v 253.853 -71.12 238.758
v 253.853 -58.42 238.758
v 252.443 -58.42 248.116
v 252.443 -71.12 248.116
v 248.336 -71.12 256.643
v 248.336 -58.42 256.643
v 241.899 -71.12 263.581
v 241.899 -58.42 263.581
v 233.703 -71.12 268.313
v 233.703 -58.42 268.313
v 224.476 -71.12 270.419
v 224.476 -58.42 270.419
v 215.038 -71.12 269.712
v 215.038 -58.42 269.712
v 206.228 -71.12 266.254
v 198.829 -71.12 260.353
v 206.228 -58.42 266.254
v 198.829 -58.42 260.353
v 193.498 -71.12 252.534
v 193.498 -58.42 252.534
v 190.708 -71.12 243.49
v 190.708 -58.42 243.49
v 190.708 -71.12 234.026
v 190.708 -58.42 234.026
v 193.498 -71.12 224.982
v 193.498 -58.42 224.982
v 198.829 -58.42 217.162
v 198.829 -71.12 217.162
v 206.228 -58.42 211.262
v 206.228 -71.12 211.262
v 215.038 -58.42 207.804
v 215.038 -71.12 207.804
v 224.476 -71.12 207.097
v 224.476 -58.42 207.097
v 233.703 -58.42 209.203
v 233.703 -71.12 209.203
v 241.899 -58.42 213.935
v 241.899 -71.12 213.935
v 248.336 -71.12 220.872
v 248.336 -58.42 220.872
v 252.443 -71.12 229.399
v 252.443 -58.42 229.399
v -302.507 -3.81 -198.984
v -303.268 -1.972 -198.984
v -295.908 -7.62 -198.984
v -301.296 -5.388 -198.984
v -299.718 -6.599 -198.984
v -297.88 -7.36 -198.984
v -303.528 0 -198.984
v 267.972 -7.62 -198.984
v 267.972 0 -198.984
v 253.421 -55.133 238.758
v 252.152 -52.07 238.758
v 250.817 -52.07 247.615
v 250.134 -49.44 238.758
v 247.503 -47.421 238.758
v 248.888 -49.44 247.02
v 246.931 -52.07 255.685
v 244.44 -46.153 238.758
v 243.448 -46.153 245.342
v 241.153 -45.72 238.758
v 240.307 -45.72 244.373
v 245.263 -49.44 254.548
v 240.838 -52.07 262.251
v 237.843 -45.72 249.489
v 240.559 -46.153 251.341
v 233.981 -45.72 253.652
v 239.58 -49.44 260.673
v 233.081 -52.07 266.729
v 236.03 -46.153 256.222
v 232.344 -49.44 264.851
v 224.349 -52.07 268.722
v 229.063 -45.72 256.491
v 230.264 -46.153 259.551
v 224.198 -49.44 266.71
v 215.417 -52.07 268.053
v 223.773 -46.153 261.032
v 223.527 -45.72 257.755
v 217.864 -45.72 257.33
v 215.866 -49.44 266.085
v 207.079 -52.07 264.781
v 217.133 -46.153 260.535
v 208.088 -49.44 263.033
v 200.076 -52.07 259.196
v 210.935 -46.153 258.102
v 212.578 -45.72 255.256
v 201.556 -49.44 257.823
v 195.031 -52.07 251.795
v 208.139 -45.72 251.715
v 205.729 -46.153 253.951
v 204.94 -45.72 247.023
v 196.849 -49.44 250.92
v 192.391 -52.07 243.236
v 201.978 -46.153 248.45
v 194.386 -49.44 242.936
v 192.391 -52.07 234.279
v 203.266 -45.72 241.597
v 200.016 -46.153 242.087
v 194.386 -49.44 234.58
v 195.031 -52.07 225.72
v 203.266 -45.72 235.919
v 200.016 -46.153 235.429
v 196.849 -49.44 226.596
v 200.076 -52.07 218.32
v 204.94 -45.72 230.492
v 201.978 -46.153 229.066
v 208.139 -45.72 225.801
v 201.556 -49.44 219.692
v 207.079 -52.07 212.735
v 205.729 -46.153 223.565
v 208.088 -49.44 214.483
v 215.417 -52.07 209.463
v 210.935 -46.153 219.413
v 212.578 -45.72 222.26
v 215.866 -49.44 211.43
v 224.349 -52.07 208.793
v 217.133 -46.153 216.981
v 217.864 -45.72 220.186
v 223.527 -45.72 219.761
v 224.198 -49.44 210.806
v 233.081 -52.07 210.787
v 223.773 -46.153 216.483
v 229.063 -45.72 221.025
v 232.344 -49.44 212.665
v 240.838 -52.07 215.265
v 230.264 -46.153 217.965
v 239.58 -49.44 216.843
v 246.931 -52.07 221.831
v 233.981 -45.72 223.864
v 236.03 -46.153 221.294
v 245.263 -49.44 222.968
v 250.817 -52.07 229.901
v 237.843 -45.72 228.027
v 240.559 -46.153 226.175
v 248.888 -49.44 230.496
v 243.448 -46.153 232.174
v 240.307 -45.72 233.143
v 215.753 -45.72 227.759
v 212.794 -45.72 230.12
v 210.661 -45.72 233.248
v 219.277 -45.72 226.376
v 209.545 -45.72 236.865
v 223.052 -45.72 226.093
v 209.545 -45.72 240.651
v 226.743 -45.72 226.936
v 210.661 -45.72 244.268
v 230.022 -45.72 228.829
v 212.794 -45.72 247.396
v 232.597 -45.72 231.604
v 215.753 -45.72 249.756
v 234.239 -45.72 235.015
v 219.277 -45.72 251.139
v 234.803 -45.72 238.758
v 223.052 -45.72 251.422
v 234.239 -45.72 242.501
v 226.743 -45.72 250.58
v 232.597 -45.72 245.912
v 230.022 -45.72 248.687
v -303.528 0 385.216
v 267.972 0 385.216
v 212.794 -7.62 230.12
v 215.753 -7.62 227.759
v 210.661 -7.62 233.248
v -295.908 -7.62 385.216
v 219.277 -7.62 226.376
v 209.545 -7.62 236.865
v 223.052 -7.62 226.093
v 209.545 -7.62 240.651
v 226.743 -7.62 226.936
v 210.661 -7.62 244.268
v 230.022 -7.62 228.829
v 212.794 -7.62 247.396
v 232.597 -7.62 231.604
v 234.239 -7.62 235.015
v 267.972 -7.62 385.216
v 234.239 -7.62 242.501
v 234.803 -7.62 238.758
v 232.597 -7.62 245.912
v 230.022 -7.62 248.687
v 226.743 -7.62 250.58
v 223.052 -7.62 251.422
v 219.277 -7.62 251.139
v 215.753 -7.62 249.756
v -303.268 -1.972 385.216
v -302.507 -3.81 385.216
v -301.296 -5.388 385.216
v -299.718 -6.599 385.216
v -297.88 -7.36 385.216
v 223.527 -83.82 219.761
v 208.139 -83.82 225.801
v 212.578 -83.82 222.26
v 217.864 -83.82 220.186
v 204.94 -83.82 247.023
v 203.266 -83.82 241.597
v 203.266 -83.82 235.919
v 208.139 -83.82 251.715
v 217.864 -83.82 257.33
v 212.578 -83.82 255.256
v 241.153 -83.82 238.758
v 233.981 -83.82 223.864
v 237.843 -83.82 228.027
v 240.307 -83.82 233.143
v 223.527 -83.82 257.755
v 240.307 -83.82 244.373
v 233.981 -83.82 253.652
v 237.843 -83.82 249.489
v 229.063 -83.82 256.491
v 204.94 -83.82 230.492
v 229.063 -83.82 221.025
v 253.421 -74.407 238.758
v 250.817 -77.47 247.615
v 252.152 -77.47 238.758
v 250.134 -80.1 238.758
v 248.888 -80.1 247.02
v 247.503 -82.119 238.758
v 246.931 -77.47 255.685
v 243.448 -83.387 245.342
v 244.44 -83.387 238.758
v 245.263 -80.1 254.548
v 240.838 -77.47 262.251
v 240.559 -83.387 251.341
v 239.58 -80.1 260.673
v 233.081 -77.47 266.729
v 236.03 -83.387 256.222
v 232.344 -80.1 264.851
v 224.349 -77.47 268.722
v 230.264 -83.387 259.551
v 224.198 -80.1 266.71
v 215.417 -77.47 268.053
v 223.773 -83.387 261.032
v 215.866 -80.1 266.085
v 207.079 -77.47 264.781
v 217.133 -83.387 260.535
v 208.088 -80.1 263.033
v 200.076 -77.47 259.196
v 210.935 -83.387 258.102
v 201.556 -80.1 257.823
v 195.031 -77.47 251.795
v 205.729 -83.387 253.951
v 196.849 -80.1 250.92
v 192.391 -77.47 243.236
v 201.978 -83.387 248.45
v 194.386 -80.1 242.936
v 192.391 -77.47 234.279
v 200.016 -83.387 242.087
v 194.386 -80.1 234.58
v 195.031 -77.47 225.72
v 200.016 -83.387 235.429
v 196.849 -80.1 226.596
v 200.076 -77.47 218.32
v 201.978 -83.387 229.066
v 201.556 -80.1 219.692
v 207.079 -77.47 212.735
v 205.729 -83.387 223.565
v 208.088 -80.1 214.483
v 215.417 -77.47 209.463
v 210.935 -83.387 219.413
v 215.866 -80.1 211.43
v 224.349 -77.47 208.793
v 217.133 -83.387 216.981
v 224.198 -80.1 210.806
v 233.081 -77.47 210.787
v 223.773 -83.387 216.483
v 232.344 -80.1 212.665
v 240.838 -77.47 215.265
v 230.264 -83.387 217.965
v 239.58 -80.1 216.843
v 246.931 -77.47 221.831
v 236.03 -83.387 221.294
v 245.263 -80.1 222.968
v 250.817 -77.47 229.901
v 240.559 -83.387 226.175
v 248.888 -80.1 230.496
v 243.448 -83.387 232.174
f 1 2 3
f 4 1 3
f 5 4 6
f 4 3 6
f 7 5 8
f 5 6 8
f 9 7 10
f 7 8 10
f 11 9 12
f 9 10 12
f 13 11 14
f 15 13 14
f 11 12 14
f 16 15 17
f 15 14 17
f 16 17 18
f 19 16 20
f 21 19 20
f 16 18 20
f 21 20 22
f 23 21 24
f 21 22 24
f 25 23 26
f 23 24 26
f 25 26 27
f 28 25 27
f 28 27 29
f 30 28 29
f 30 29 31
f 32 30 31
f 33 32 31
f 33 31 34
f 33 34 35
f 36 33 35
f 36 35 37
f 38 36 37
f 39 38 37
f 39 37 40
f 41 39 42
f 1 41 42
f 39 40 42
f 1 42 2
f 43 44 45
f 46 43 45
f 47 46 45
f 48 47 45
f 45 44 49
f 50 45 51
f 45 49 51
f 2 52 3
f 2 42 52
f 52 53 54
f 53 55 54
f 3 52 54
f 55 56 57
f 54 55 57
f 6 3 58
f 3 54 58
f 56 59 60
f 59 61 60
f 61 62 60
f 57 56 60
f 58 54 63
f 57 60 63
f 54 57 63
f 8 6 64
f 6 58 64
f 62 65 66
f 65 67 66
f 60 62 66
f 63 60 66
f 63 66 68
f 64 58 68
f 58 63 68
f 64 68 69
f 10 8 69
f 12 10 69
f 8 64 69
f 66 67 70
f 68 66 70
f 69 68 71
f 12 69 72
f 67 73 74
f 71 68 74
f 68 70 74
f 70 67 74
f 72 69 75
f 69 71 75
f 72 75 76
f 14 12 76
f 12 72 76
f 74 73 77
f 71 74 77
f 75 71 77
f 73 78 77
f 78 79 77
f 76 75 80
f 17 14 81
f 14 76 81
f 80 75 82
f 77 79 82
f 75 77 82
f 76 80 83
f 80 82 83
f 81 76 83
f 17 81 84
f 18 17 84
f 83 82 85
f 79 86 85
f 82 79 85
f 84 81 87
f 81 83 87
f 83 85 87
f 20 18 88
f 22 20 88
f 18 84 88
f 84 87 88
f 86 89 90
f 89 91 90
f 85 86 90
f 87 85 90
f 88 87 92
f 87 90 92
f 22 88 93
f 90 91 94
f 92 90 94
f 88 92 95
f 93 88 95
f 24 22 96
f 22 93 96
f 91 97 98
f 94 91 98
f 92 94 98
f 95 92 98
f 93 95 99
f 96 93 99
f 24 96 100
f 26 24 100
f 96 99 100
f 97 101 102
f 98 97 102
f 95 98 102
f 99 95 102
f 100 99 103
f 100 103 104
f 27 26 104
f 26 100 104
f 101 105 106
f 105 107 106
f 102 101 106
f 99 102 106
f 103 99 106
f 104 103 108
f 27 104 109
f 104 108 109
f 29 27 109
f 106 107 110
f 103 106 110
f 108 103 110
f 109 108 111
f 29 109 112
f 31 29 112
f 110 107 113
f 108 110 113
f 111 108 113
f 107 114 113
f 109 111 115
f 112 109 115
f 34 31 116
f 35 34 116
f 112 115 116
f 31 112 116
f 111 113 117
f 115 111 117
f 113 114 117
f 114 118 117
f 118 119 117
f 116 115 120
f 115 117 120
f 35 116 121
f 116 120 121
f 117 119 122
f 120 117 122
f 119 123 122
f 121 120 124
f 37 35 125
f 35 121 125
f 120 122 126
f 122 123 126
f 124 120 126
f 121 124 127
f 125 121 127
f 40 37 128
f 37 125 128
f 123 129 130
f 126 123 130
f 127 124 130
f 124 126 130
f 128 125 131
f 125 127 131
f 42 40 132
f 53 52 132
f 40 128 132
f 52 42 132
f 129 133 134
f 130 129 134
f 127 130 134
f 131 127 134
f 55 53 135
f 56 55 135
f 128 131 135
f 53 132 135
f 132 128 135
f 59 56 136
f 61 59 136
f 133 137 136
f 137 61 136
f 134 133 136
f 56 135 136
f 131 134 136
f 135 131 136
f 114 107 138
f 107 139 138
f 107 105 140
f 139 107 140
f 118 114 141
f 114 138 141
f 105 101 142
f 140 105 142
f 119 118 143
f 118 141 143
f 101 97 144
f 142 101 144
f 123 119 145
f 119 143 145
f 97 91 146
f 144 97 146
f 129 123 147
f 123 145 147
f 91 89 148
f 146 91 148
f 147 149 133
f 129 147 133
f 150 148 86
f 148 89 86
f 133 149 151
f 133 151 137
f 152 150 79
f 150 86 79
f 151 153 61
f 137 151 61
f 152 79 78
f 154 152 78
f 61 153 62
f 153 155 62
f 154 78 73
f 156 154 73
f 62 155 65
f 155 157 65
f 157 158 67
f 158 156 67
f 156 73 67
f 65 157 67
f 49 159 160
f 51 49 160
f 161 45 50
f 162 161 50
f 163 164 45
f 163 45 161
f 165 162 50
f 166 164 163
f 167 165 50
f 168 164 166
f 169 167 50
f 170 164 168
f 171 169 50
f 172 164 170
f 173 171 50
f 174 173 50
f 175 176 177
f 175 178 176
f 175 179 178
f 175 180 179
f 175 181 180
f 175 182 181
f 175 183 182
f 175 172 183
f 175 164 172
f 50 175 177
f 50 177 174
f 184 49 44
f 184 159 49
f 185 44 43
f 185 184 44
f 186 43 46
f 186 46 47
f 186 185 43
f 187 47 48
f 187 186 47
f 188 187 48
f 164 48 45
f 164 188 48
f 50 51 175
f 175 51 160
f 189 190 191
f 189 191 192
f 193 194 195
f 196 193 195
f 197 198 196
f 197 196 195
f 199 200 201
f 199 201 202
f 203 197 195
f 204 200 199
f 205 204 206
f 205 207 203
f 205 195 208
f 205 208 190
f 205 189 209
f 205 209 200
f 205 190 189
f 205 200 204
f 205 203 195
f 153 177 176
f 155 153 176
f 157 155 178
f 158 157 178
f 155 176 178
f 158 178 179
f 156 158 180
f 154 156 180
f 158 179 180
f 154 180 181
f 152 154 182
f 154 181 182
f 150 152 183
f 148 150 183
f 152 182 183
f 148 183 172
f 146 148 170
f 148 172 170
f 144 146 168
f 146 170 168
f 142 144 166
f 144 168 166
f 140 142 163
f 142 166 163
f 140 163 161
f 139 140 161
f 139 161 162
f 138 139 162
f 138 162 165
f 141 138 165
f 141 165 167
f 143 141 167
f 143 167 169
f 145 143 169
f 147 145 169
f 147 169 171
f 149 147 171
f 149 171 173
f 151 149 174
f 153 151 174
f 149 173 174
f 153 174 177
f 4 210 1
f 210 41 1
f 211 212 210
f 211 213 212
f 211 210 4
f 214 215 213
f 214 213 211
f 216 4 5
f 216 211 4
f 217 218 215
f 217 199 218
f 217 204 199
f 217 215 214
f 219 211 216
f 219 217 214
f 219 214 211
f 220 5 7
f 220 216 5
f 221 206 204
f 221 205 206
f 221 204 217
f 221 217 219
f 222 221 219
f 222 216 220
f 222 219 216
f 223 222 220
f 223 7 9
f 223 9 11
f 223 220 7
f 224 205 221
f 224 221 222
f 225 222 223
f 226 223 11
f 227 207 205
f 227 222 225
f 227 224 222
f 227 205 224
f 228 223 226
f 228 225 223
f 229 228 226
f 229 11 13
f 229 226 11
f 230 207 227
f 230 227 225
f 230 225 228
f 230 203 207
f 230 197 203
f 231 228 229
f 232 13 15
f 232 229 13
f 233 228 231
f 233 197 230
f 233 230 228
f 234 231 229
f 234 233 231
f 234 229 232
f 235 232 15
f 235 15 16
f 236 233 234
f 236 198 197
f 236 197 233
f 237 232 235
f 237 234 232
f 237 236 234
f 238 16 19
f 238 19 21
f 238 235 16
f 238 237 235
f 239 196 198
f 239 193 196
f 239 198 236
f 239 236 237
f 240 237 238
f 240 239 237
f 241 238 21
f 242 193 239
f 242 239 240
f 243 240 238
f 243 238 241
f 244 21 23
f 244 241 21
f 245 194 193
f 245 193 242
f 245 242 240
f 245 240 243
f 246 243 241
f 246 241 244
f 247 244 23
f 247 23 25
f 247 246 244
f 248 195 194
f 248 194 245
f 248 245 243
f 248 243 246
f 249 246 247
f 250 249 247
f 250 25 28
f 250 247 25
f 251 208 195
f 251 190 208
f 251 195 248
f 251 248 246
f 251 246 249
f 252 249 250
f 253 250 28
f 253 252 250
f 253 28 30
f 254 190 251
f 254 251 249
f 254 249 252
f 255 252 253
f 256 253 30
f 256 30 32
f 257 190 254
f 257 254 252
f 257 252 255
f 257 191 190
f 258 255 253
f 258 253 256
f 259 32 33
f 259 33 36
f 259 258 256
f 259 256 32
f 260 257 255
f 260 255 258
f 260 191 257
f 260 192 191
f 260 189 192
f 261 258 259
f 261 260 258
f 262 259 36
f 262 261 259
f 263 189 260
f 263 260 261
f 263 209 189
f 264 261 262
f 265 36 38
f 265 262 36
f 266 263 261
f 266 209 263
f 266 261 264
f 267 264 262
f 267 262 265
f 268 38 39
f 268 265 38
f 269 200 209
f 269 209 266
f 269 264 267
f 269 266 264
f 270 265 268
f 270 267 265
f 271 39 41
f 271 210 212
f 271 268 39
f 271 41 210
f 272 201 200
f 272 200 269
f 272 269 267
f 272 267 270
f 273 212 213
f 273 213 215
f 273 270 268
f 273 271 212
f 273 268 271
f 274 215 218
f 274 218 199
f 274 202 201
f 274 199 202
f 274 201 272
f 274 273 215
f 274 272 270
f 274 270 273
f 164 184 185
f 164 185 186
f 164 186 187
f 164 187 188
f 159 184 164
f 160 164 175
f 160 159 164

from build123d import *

# Parameters (mm, degrees)
F0_W     = 571.5
F0_H     = 584.2
F1_DEPTH = 7.62
F2_R     = 7.61999
F3_R     = 12.7
F4_DEPTH = 38.1
F5_R     = 31.75
F5_R_2   = 12.7
F6_DEPTH = 38.1
F7_R     = 12.7


# Not quite as in the source:
# - a fillet or chamfer is up to 0.001 mm smaller than in the source, because OpenCascade refuses the exact size


with BuildPart() as f1:
    # F0 (on Front) → F1 (new body)
    with BuildSketch(Plane.XZ):
        with Locations((-17.7775520504, 93.1158526728)):
            Rectangle(F0_W, F0_H)
    extrude(amount=F1_DEPTH)

    # F2 (radius 7.62 in the source; OpenCascade refuses exactly that, so slightly less here)
    f2_edges = [f1.edges().sort_by_distance(p)[0] for p in [
        (-303.527552, -7.62, 93.115853),
    ]]
    fillet(f2_edges, radius=F2_R)

    # F3 (on face) → F4 (join)
    with BuildSketch(Plane.XZ.offset(7.62)):
        with Locations((222.1034169197, 238.7578934431)):
            Circle(F3_R)
    extrude(amount=F4_DEPTH)

    # F5 (on face) → F6 (join)
    with BuildSketch(Plane.XZ.offset(45.72)):
        with Locations((222.1034169197, 238.7578934431)):
            Circle(F5_R)
        with Locations((222.1034169197, 238.7578934431)):
            Circle(F5_R_2, mode=Mode.SUBTRACT)
        with Locations((222.1034169197, 238.7578934431)):
            Circle(F5_R_2)
    extrude(amount=F6_DEPTH)

    # F7
    f7_edges = [f1.edges().sort_by_distance(p)[0] for p in [
        (190.353417, -83.82, 238.757893),
        (190.353417, -45.72, 238.757893),
    ]]
    fillet(f7_edges, radius=F7_R)


solid = f1.part
